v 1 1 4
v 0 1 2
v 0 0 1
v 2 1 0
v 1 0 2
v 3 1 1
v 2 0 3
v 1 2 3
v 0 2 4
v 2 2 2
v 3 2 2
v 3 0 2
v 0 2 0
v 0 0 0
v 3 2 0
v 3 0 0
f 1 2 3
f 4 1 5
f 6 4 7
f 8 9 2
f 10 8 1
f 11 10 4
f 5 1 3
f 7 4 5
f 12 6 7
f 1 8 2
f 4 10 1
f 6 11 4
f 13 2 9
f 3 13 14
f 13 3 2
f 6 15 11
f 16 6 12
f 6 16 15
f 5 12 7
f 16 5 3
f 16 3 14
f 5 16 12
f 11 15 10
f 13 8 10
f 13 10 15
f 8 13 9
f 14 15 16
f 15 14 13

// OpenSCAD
//
// surface_matrix.scad (OpenSCAD)
// 
// Copyright 2019 olikraus@gmail.com
// 
// Redistribution and use in source and binary forms, 
// with or without modification, are permitted
// provided that the following conditions are met:
// 
// 1. Redistributions of source code must retain 
// the above copyright notice, this list of conditions 
// and the following disclaimer.
// 
// 2. Redistributions in binary form must reproduce 
// the above copyright notice, this list of conditions 
// and the following disclaimer in the documentation 
// and/or other materials provided with the distribution.
// 
// THIS SOFTWARE IS PROVIDED BY THE COPYRIGHT HOLDERS 
// AND CONTRIBUTORS "AS IS" AND ANY EXPRESS OR IMPLIED 
// WARRANTIES, INCLUDING, BUT NOT LIMITED TO, THE IMPLIED 
// WARRANTIES OF MERCHANTABILITY AND FITNESS FOR A 
// PARTICULAR PURPOSE ARE DISCLAIMED. IN NO EVENT SHALL 
// THE COPYRIGHT HOLDER OR CONTRIBUTORS BE LIABLE FOR 
// ANY DIRECT, INDIRECT, INCIDENTAL, SPECIAL, EXEMPLARY, 
// OR CONSEQUENTIAL DAMAGES (INCLUDING, BUT NOT LIMITED 
// TO, PROCUREMENT OF SUBSTITUTE GOODS OR SERVICES; 
// LOSS OF USE, DATA, OR PROFITS; OR BUSINESS INTERRUPTION) 
// HOWEVER CAUSED AND ON ANY THEORY OF LIABILITY, WHETHER 
// IN CONTRACT, STRICT LIABILITY, OR TORT (INCLUDING 
// NEGLIGENCE OR OTHERWISE) ARISING IN ANY WAY OUT OF 
// THE USE OF THIS SOFTWARE, EVEN IF ADVISED OF THE 
// POSSIBILITY OF SUCH DAMAGE.
//
// Name: 
//  surface_matrix(matrix=[[1,1],[1,1]], scale=[1,1,1])
//
// Description:
//  Similar to the "surface" function:
//  Calculate a polyhedron out of a height map, which is given as a
//  matrix (vector of vectors)
//  
// Arguments:
//  matrix: 
//      Vector of vectors with the height information.
//      Values below 0 are treated as 0.
//  scale:
//      A vector with three scale factors for x, y and z. Defaults to [1,1,1]
//      This allows on the fly scaling of the generated polyhedron.
//
// Notes:
//  convexity is fixed to 10
//  "invert" and "center" arguments as known from the "surface" command are not supported
//

module surface_matrix(matrix=[[1,1],[1,1]], scale=[1,1,1]) {

    // Get all the z values from the height map and generate
    // a point list out of it.
    // Add the corners of z=0 plane to the end of the list.
    function hm_to_points(m, scalex=1, scaley=1,scalez=1) = [

        // Convert the height map to points.
        // Values below 0 are made 0.
        for( j=[0:len(m)-1] ) 
            for ( i =[0:len(m[0])-1] ) 
                [i*scalex, j*scaley, m[j][i] > 0 ? m[j][i]*scalez : 0 ]
        ,
        // Store the edges with z=0 at the end of the point list
        [0,0,0],
        [(len(m[0])-1)*scalex, 0, 0],
        [0, (len(m)-1)*scaley, 0],
        [(len(m[0])-1)*scalex, (len(m)-1)*scaley, 0] 
    ];

    // get lower left triangle face for a given point
    // width is the width of the heightmap
    function hm_pt_triangle_ll(width,x,y) = [ 
        y*width+x, (y+1)*width+x, (y+1)*width+x+1
    ];

    // get upper right triangle face for a given point
    // width is the width of the heightmap
    function hm_pt_triangle_ur(width,x,y) = [ 
        y*width+x, (y+1)*width+x+1, y*width+x+1
    ];

    // get all faces out of the height map for the polyhedron
    function hm_to_faces(m) = [
        // lower left triangle faces
        for( y=[0:len(m)-2] ) 
            for ( x =[0:len(m[0])-2] ) 
                hm_pt_triangle_ll(len(m[0]), x, y)
        ,
        // upper right triangle faces
        for( y=[0:len(m)-2] ) 
            for ( x =[0:len(m[0])-2] )         
                hm_pt_triangle_ur(len(m[0]), x, y)
        ,
        // all for sides
        [ 
            for( y=[0:len(m)-1] ) (len(m)-1-y)*len(m[0]),
            len(m)*len(m[0])+0,
            len(m)*len(m[0])+2
        ],
        [ 
            for( y=[0:len(m)-1] ) (y+1)*len(m[0])-1,
            len(m)*len(m[0])+3,
            len(m)*len(m[0])+1
        ],
        [ 
            for( x=[0:len(m[0])-1] ) x,
            len(m)*len(m[0])+1,
            len(m)*len(m[0])+0
        ],
        [ 
            for( x=[0:len(m[0])-1] ) len(m)*len(m[0])-1-x,
            len(m)*len(m[0])+2,
            len(m)*len(m[0])+3
        ],
        // buttom face
        [
            len(m)*len(m[0])+0,
            len(m)*len(m[0])+1,
            len(m)*len(m[0])+3,
            len(m)*len(m[0])+2
        ] 

    ];
    
           
    polyhedron( 
        points = hm_to_points(matrix,scale[0],scale[1],scale[2]), 
        faces = hm_to_faces(matrix), 
        convexity=10 );
}

m = [ [ 1, 2, 3, 2], [2, 4, -1, 1], [4, 3, 2, 2] ];
surface_matrix(m, scale=[1,1,1]);
